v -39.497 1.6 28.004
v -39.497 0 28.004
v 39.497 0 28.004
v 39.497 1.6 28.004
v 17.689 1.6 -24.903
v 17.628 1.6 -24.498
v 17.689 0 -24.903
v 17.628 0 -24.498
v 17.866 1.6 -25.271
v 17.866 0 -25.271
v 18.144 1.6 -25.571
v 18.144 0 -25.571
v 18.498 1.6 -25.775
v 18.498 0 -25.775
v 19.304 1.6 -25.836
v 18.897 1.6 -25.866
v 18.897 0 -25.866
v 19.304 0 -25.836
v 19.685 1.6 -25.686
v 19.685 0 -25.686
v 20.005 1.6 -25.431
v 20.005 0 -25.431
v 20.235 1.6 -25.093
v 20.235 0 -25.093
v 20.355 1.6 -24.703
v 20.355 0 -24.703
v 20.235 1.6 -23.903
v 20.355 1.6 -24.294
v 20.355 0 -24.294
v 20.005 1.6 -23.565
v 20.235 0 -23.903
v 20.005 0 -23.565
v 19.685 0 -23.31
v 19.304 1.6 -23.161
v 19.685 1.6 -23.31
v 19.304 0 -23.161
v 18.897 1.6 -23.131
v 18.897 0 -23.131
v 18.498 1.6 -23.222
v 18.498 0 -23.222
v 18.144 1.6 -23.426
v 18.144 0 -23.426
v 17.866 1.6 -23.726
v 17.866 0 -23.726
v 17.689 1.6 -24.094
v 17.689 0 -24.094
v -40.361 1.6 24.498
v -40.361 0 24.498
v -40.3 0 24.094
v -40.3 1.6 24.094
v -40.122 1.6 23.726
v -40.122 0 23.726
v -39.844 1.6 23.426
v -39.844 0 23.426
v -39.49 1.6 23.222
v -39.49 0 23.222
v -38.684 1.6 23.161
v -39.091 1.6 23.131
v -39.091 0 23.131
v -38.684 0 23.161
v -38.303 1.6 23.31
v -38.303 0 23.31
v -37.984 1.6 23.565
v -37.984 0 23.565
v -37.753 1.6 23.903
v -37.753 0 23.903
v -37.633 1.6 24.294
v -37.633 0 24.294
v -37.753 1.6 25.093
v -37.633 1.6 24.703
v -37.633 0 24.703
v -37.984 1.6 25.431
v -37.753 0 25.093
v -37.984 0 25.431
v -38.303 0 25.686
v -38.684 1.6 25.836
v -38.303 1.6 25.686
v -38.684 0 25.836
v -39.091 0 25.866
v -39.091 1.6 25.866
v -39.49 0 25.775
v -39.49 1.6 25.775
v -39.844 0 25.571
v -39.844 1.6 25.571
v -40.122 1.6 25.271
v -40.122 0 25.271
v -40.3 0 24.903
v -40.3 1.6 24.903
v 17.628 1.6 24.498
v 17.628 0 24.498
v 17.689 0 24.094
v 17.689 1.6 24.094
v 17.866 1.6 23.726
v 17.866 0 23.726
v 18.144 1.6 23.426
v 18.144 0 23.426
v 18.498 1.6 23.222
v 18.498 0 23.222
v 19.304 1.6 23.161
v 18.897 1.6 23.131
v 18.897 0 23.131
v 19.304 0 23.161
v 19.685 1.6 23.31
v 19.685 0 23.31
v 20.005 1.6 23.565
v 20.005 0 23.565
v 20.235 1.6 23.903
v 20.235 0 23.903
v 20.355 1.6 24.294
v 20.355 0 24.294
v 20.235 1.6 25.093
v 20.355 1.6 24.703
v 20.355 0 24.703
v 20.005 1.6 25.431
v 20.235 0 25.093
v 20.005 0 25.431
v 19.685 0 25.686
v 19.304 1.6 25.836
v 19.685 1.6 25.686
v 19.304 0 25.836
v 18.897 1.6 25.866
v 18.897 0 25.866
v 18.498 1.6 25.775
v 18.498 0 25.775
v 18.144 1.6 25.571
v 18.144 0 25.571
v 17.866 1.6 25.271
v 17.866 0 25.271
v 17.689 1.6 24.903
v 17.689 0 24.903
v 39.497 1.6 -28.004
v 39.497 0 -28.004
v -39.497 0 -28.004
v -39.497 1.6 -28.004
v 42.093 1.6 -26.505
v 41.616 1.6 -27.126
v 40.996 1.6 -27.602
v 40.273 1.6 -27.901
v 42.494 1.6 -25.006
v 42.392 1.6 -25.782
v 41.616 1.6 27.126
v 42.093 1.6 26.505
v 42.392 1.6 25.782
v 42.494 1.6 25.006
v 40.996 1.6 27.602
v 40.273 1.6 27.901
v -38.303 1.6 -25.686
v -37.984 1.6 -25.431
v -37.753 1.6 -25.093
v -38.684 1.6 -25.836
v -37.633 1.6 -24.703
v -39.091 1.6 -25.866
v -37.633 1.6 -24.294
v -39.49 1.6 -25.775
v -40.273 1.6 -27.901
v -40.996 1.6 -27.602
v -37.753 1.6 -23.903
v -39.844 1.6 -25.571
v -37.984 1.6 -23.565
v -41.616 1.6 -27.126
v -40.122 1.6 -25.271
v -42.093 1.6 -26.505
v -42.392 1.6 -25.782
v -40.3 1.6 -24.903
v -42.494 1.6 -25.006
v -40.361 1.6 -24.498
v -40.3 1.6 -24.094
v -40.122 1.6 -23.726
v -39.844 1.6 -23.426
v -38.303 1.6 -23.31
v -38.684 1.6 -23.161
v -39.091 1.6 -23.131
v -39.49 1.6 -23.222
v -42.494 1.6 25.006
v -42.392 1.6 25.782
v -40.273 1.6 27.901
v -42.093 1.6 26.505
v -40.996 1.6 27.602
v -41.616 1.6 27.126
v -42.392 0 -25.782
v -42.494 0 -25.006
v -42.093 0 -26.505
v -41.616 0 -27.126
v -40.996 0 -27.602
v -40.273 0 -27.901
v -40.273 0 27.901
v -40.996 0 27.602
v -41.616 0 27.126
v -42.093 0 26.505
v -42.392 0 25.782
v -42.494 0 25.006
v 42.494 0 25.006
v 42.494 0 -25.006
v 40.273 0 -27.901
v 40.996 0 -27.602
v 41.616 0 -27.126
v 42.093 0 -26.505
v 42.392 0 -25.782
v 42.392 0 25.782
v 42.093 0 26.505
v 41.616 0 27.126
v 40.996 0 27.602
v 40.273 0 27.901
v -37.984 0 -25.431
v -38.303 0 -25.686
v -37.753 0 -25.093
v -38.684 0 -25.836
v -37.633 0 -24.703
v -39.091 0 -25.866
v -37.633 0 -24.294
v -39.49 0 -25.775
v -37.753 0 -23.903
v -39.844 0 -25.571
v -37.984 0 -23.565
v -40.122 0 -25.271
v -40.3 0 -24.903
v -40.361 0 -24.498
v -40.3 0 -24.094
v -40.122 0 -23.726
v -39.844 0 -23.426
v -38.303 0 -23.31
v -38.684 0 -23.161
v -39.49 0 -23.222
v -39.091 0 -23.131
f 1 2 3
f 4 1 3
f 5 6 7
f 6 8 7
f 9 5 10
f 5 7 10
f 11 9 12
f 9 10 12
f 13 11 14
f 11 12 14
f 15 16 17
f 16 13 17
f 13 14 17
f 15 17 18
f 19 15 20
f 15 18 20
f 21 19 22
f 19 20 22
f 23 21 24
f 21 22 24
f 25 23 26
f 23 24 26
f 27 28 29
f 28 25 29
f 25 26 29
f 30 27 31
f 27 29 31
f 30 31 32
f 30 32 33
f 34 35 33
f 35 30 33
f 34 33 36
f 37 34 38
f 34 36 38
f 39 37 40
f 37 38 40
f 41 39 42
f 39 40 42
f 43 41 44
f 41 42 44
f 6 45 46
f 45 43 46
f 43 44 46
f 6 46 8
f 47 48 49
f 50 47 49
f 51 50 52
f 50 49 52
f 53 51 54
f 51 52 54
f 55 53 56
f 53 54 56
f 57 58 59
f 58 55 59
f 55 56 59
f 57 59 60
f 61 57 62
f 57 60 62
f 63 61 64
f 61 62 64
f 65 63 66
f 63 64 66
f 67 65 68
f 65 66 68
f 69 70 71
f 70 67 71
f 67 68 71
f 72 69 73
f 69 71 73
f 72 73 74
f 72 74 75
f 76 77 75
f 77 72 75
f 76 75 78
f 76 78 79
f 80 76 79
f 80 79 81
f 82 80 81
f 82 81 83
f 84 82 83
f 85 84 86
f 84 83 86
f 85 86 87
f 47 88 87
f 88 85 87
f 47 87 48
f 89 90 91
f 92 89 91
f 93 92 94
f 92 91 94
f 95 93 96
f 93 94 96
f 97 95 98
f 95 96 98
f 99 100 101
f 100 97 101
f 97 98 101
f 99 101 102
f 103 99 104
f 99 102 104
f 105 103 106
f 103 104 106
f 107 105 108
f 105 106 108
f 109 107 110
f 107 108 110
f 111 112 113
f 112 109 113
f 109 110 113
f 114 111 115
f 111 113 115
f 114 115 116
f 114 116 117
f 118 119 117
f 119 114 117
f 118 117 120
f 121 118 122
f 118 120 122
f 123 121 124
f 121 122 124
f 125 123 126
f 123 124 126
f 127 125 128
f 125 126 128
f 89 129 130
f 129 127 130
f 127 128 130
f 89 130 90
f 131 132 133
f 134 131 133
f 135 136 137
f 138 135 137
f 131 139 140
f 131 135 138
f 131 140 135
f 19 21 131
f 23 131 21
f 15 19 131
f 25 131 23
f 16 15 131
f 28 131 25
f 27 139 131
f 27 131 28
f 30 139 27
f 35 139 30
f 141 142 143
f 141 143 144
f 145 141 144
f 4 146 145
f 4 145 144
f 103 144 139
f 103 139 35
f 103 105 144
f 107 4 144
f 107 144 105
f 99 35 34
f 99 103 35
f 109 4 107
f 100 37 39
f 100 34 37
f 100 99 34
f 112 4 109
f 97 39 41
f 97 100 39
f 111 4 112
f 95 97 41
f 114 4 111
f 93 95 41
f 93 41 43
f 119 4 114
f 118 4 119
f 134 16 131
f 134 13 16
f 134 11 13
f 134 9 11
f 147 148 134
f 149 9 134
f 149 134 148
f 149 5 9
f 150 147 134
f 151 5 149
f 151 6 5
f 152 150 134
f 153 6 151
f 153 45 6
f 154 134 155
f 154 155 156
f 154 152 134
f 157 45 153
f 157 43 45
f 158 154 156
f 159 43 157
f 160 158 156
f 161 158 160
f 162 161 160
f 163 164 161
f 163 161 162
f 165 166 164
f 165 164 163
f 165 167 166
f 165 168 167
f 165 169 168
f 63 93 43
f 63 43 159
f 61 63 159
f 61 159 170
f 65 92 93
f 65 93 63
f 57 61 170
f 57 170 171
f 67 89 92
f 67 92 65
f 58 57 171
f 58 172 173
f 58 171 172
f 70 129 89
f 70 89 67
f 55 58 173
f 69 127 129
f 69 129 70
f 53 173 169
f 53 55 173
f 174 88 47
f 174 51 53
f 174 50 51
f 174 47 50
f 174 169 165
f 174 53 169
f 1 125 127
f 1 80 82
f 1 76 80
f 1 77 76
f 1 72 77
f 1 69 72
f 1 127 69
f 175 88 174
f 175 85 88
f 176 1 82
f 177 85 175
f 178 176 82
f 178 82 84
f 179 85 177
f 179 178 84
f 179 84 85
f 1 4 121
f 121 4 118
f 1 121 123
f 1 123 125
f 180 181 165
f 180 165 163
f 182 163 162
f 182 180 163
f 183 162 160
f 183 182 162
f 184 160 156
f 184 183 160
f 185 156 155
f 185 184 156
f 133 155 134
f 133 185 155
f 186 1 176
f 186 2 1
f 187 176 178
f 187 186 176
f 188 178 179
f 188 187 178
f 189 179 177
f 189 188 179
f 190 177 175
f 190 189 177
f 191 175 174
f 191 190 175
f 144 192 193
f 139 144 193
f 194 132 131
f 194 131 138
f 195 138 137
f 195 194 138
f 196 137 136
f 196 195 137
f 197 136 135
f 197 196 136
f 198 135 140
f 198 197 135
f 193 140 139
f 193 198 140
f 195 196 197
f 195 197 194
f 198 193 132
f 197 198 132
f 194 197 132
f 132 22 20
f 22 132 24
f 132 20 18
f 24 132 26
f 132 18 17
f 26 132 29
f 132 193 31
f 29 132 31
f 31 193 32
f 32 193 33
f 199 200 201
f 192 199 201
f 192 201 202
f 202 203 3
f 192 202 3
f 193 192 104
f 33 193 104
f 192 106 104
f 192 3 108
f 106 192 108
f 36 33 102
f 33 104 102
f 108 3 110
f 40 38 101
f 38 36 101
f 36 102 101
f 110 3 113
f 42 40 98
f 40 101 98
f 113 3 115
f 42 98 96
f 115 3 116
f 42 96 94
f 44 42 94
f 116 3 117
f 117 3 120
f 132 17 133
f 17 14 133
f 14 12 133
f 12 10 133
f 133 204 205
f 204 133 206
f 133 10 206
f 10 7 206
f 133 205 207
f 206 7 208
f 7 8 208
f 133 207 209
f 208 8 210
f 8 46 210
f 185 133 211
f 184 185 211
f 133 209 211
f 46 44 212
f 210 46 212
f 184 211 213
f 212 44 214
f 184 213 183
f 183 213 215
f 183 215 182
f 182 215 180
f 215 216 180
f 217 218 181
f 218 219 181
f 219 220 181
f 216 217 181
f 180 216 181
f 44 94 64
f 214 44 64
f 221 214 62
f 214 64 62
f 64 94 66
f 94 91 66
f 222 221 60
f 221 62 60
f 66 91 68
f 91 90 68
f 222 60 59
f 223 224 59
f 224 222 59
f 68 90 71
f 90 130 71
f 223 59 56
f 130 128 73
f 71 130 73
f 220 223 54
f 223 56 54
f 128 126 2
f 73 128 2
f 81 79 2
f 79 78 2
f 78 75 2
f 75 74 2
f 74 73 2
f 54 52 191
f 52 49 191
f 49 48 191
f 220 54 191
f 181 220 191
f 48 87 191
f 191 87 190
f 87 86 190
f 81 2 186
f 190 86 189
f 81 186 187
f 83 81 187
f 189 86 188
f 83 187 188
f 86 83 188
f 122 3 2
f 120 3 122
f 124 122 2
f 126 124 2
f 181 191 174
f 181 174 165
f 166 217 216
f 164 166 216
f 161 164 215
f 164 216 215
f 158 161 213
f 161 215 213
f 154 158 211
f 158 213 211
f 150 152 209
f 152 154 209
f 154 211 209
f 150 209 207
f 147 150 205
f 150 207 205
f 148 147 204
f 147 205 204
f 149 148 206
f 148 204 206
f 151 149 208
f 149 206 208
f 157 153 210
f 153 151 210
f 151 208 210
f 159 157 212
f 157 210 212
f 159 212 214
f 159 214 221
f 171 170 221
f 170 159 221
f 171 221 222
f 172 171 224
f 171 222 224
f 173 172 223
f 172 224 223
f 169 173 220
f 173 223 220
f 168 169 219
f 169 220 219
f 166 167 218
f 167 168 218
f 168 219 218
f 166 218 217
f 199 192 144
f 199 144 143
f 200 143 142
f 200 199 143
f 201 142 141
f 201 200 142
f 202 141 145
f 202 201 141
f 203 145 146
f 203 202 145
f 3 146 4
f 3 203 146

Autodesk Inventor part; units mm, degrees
ref_plane "YZ Plane" through (0, 0, 0) normal (1, 0, 0) x (0, 1, 0)
ref_plane "XZ Plane" through (0, 0, 0) normal (0, 1, 0) x (-1, 0, 0)
ref_plane "XY Plane" through (0, 0, 0) normal (0, 0, 1) x (1, 0, 0)
sketch "Sketch1" plane through (0, 0, 0) normal (0, 1, 0) x (-1, 0, 0)
  line L0 (42.4942, 28.0035) -> (-42.4942, 28.0035) construction
  line L1 (-42.4942, 28.0035) -> (-42.4942, -28.0035) construction
  line L2 (-42.4942, -28.0035) -> (42.4942, -28.0035) construction
  line L3 (42.4942, -28.0035) -> (42.4942, 28.0035) construction
  line L4 (0, -40.0739) -> (0, 40.0739) construction
  line L5 (60.3609, 0) -> (-60.3609, 0) construction
  circle A0 centre (38.989, -24.4983) radius 1.3716
  circle A1 centre (-18.9992, -24.4983) radius 1.3716
  circle A2 centre (-18.9992, 24.4983) radius 1.3716
  circle A3 centre (38.989, 24.4983) radius 1.3716
  line L6 (42.4942, 25.0063) -> (42.4942, -25.0063)
  line L7 (39.497, 28.0035) -> (-39.497, 28.0035)
  line L8 (-42.4942, 25.0063) -> (-42.4942, -25.0063)
  line L9 (-39.497, -28.0035) -> (39.497, -28.0035)
  arc A4 (42.4942, 25.0063) -> (39.497, 28.0035) centre (39.497, 25.0063) ccw
  arc A5 (39.497, -28.0035) -> (42.4942, -25.0063) centre (39.497, -25.0063) ccw
  arc A6 (-42.4942, -25.0063) -> (-39.497, -28.0035) centre (-39.497, -25.0063) ccw
  arc A7 (-39.497, 28.0035) -> (-42.4942, 25.0063) centre (-39.497, 25.0063) ccw
  point P0 (0, 0)
  dimension "d0" = 84.9884
  dimension "d1" = 56.007
  dimension "d2" = 0
  dimension "d3" = 0
  dimension "d4" = 0
  dimension "d5" = 0
  dimension "d6" = 2.7432
  dimension "d7" = 3.5052
  dimension "d8" = 3.5052
  dimension "d9" = 3.5052
  dimension "d10" = 57.9882
  dimension "d11" = 2.9972
  dimension "d12" = 2.9972
  dimension "d13" = 2.9972
  dimension "d14" = 2.9972
  dimension "d15" = 2.9972
  dimension "d16" = 2.9972
  dimension "d17" = 2.9972
  dimension "d18" = 2.9972
extrude "Extrusion1" add sketch "Sketch1" along normal blind 1.6002
properties part number "Raspberry-Pi-3B[with_Screen]"
